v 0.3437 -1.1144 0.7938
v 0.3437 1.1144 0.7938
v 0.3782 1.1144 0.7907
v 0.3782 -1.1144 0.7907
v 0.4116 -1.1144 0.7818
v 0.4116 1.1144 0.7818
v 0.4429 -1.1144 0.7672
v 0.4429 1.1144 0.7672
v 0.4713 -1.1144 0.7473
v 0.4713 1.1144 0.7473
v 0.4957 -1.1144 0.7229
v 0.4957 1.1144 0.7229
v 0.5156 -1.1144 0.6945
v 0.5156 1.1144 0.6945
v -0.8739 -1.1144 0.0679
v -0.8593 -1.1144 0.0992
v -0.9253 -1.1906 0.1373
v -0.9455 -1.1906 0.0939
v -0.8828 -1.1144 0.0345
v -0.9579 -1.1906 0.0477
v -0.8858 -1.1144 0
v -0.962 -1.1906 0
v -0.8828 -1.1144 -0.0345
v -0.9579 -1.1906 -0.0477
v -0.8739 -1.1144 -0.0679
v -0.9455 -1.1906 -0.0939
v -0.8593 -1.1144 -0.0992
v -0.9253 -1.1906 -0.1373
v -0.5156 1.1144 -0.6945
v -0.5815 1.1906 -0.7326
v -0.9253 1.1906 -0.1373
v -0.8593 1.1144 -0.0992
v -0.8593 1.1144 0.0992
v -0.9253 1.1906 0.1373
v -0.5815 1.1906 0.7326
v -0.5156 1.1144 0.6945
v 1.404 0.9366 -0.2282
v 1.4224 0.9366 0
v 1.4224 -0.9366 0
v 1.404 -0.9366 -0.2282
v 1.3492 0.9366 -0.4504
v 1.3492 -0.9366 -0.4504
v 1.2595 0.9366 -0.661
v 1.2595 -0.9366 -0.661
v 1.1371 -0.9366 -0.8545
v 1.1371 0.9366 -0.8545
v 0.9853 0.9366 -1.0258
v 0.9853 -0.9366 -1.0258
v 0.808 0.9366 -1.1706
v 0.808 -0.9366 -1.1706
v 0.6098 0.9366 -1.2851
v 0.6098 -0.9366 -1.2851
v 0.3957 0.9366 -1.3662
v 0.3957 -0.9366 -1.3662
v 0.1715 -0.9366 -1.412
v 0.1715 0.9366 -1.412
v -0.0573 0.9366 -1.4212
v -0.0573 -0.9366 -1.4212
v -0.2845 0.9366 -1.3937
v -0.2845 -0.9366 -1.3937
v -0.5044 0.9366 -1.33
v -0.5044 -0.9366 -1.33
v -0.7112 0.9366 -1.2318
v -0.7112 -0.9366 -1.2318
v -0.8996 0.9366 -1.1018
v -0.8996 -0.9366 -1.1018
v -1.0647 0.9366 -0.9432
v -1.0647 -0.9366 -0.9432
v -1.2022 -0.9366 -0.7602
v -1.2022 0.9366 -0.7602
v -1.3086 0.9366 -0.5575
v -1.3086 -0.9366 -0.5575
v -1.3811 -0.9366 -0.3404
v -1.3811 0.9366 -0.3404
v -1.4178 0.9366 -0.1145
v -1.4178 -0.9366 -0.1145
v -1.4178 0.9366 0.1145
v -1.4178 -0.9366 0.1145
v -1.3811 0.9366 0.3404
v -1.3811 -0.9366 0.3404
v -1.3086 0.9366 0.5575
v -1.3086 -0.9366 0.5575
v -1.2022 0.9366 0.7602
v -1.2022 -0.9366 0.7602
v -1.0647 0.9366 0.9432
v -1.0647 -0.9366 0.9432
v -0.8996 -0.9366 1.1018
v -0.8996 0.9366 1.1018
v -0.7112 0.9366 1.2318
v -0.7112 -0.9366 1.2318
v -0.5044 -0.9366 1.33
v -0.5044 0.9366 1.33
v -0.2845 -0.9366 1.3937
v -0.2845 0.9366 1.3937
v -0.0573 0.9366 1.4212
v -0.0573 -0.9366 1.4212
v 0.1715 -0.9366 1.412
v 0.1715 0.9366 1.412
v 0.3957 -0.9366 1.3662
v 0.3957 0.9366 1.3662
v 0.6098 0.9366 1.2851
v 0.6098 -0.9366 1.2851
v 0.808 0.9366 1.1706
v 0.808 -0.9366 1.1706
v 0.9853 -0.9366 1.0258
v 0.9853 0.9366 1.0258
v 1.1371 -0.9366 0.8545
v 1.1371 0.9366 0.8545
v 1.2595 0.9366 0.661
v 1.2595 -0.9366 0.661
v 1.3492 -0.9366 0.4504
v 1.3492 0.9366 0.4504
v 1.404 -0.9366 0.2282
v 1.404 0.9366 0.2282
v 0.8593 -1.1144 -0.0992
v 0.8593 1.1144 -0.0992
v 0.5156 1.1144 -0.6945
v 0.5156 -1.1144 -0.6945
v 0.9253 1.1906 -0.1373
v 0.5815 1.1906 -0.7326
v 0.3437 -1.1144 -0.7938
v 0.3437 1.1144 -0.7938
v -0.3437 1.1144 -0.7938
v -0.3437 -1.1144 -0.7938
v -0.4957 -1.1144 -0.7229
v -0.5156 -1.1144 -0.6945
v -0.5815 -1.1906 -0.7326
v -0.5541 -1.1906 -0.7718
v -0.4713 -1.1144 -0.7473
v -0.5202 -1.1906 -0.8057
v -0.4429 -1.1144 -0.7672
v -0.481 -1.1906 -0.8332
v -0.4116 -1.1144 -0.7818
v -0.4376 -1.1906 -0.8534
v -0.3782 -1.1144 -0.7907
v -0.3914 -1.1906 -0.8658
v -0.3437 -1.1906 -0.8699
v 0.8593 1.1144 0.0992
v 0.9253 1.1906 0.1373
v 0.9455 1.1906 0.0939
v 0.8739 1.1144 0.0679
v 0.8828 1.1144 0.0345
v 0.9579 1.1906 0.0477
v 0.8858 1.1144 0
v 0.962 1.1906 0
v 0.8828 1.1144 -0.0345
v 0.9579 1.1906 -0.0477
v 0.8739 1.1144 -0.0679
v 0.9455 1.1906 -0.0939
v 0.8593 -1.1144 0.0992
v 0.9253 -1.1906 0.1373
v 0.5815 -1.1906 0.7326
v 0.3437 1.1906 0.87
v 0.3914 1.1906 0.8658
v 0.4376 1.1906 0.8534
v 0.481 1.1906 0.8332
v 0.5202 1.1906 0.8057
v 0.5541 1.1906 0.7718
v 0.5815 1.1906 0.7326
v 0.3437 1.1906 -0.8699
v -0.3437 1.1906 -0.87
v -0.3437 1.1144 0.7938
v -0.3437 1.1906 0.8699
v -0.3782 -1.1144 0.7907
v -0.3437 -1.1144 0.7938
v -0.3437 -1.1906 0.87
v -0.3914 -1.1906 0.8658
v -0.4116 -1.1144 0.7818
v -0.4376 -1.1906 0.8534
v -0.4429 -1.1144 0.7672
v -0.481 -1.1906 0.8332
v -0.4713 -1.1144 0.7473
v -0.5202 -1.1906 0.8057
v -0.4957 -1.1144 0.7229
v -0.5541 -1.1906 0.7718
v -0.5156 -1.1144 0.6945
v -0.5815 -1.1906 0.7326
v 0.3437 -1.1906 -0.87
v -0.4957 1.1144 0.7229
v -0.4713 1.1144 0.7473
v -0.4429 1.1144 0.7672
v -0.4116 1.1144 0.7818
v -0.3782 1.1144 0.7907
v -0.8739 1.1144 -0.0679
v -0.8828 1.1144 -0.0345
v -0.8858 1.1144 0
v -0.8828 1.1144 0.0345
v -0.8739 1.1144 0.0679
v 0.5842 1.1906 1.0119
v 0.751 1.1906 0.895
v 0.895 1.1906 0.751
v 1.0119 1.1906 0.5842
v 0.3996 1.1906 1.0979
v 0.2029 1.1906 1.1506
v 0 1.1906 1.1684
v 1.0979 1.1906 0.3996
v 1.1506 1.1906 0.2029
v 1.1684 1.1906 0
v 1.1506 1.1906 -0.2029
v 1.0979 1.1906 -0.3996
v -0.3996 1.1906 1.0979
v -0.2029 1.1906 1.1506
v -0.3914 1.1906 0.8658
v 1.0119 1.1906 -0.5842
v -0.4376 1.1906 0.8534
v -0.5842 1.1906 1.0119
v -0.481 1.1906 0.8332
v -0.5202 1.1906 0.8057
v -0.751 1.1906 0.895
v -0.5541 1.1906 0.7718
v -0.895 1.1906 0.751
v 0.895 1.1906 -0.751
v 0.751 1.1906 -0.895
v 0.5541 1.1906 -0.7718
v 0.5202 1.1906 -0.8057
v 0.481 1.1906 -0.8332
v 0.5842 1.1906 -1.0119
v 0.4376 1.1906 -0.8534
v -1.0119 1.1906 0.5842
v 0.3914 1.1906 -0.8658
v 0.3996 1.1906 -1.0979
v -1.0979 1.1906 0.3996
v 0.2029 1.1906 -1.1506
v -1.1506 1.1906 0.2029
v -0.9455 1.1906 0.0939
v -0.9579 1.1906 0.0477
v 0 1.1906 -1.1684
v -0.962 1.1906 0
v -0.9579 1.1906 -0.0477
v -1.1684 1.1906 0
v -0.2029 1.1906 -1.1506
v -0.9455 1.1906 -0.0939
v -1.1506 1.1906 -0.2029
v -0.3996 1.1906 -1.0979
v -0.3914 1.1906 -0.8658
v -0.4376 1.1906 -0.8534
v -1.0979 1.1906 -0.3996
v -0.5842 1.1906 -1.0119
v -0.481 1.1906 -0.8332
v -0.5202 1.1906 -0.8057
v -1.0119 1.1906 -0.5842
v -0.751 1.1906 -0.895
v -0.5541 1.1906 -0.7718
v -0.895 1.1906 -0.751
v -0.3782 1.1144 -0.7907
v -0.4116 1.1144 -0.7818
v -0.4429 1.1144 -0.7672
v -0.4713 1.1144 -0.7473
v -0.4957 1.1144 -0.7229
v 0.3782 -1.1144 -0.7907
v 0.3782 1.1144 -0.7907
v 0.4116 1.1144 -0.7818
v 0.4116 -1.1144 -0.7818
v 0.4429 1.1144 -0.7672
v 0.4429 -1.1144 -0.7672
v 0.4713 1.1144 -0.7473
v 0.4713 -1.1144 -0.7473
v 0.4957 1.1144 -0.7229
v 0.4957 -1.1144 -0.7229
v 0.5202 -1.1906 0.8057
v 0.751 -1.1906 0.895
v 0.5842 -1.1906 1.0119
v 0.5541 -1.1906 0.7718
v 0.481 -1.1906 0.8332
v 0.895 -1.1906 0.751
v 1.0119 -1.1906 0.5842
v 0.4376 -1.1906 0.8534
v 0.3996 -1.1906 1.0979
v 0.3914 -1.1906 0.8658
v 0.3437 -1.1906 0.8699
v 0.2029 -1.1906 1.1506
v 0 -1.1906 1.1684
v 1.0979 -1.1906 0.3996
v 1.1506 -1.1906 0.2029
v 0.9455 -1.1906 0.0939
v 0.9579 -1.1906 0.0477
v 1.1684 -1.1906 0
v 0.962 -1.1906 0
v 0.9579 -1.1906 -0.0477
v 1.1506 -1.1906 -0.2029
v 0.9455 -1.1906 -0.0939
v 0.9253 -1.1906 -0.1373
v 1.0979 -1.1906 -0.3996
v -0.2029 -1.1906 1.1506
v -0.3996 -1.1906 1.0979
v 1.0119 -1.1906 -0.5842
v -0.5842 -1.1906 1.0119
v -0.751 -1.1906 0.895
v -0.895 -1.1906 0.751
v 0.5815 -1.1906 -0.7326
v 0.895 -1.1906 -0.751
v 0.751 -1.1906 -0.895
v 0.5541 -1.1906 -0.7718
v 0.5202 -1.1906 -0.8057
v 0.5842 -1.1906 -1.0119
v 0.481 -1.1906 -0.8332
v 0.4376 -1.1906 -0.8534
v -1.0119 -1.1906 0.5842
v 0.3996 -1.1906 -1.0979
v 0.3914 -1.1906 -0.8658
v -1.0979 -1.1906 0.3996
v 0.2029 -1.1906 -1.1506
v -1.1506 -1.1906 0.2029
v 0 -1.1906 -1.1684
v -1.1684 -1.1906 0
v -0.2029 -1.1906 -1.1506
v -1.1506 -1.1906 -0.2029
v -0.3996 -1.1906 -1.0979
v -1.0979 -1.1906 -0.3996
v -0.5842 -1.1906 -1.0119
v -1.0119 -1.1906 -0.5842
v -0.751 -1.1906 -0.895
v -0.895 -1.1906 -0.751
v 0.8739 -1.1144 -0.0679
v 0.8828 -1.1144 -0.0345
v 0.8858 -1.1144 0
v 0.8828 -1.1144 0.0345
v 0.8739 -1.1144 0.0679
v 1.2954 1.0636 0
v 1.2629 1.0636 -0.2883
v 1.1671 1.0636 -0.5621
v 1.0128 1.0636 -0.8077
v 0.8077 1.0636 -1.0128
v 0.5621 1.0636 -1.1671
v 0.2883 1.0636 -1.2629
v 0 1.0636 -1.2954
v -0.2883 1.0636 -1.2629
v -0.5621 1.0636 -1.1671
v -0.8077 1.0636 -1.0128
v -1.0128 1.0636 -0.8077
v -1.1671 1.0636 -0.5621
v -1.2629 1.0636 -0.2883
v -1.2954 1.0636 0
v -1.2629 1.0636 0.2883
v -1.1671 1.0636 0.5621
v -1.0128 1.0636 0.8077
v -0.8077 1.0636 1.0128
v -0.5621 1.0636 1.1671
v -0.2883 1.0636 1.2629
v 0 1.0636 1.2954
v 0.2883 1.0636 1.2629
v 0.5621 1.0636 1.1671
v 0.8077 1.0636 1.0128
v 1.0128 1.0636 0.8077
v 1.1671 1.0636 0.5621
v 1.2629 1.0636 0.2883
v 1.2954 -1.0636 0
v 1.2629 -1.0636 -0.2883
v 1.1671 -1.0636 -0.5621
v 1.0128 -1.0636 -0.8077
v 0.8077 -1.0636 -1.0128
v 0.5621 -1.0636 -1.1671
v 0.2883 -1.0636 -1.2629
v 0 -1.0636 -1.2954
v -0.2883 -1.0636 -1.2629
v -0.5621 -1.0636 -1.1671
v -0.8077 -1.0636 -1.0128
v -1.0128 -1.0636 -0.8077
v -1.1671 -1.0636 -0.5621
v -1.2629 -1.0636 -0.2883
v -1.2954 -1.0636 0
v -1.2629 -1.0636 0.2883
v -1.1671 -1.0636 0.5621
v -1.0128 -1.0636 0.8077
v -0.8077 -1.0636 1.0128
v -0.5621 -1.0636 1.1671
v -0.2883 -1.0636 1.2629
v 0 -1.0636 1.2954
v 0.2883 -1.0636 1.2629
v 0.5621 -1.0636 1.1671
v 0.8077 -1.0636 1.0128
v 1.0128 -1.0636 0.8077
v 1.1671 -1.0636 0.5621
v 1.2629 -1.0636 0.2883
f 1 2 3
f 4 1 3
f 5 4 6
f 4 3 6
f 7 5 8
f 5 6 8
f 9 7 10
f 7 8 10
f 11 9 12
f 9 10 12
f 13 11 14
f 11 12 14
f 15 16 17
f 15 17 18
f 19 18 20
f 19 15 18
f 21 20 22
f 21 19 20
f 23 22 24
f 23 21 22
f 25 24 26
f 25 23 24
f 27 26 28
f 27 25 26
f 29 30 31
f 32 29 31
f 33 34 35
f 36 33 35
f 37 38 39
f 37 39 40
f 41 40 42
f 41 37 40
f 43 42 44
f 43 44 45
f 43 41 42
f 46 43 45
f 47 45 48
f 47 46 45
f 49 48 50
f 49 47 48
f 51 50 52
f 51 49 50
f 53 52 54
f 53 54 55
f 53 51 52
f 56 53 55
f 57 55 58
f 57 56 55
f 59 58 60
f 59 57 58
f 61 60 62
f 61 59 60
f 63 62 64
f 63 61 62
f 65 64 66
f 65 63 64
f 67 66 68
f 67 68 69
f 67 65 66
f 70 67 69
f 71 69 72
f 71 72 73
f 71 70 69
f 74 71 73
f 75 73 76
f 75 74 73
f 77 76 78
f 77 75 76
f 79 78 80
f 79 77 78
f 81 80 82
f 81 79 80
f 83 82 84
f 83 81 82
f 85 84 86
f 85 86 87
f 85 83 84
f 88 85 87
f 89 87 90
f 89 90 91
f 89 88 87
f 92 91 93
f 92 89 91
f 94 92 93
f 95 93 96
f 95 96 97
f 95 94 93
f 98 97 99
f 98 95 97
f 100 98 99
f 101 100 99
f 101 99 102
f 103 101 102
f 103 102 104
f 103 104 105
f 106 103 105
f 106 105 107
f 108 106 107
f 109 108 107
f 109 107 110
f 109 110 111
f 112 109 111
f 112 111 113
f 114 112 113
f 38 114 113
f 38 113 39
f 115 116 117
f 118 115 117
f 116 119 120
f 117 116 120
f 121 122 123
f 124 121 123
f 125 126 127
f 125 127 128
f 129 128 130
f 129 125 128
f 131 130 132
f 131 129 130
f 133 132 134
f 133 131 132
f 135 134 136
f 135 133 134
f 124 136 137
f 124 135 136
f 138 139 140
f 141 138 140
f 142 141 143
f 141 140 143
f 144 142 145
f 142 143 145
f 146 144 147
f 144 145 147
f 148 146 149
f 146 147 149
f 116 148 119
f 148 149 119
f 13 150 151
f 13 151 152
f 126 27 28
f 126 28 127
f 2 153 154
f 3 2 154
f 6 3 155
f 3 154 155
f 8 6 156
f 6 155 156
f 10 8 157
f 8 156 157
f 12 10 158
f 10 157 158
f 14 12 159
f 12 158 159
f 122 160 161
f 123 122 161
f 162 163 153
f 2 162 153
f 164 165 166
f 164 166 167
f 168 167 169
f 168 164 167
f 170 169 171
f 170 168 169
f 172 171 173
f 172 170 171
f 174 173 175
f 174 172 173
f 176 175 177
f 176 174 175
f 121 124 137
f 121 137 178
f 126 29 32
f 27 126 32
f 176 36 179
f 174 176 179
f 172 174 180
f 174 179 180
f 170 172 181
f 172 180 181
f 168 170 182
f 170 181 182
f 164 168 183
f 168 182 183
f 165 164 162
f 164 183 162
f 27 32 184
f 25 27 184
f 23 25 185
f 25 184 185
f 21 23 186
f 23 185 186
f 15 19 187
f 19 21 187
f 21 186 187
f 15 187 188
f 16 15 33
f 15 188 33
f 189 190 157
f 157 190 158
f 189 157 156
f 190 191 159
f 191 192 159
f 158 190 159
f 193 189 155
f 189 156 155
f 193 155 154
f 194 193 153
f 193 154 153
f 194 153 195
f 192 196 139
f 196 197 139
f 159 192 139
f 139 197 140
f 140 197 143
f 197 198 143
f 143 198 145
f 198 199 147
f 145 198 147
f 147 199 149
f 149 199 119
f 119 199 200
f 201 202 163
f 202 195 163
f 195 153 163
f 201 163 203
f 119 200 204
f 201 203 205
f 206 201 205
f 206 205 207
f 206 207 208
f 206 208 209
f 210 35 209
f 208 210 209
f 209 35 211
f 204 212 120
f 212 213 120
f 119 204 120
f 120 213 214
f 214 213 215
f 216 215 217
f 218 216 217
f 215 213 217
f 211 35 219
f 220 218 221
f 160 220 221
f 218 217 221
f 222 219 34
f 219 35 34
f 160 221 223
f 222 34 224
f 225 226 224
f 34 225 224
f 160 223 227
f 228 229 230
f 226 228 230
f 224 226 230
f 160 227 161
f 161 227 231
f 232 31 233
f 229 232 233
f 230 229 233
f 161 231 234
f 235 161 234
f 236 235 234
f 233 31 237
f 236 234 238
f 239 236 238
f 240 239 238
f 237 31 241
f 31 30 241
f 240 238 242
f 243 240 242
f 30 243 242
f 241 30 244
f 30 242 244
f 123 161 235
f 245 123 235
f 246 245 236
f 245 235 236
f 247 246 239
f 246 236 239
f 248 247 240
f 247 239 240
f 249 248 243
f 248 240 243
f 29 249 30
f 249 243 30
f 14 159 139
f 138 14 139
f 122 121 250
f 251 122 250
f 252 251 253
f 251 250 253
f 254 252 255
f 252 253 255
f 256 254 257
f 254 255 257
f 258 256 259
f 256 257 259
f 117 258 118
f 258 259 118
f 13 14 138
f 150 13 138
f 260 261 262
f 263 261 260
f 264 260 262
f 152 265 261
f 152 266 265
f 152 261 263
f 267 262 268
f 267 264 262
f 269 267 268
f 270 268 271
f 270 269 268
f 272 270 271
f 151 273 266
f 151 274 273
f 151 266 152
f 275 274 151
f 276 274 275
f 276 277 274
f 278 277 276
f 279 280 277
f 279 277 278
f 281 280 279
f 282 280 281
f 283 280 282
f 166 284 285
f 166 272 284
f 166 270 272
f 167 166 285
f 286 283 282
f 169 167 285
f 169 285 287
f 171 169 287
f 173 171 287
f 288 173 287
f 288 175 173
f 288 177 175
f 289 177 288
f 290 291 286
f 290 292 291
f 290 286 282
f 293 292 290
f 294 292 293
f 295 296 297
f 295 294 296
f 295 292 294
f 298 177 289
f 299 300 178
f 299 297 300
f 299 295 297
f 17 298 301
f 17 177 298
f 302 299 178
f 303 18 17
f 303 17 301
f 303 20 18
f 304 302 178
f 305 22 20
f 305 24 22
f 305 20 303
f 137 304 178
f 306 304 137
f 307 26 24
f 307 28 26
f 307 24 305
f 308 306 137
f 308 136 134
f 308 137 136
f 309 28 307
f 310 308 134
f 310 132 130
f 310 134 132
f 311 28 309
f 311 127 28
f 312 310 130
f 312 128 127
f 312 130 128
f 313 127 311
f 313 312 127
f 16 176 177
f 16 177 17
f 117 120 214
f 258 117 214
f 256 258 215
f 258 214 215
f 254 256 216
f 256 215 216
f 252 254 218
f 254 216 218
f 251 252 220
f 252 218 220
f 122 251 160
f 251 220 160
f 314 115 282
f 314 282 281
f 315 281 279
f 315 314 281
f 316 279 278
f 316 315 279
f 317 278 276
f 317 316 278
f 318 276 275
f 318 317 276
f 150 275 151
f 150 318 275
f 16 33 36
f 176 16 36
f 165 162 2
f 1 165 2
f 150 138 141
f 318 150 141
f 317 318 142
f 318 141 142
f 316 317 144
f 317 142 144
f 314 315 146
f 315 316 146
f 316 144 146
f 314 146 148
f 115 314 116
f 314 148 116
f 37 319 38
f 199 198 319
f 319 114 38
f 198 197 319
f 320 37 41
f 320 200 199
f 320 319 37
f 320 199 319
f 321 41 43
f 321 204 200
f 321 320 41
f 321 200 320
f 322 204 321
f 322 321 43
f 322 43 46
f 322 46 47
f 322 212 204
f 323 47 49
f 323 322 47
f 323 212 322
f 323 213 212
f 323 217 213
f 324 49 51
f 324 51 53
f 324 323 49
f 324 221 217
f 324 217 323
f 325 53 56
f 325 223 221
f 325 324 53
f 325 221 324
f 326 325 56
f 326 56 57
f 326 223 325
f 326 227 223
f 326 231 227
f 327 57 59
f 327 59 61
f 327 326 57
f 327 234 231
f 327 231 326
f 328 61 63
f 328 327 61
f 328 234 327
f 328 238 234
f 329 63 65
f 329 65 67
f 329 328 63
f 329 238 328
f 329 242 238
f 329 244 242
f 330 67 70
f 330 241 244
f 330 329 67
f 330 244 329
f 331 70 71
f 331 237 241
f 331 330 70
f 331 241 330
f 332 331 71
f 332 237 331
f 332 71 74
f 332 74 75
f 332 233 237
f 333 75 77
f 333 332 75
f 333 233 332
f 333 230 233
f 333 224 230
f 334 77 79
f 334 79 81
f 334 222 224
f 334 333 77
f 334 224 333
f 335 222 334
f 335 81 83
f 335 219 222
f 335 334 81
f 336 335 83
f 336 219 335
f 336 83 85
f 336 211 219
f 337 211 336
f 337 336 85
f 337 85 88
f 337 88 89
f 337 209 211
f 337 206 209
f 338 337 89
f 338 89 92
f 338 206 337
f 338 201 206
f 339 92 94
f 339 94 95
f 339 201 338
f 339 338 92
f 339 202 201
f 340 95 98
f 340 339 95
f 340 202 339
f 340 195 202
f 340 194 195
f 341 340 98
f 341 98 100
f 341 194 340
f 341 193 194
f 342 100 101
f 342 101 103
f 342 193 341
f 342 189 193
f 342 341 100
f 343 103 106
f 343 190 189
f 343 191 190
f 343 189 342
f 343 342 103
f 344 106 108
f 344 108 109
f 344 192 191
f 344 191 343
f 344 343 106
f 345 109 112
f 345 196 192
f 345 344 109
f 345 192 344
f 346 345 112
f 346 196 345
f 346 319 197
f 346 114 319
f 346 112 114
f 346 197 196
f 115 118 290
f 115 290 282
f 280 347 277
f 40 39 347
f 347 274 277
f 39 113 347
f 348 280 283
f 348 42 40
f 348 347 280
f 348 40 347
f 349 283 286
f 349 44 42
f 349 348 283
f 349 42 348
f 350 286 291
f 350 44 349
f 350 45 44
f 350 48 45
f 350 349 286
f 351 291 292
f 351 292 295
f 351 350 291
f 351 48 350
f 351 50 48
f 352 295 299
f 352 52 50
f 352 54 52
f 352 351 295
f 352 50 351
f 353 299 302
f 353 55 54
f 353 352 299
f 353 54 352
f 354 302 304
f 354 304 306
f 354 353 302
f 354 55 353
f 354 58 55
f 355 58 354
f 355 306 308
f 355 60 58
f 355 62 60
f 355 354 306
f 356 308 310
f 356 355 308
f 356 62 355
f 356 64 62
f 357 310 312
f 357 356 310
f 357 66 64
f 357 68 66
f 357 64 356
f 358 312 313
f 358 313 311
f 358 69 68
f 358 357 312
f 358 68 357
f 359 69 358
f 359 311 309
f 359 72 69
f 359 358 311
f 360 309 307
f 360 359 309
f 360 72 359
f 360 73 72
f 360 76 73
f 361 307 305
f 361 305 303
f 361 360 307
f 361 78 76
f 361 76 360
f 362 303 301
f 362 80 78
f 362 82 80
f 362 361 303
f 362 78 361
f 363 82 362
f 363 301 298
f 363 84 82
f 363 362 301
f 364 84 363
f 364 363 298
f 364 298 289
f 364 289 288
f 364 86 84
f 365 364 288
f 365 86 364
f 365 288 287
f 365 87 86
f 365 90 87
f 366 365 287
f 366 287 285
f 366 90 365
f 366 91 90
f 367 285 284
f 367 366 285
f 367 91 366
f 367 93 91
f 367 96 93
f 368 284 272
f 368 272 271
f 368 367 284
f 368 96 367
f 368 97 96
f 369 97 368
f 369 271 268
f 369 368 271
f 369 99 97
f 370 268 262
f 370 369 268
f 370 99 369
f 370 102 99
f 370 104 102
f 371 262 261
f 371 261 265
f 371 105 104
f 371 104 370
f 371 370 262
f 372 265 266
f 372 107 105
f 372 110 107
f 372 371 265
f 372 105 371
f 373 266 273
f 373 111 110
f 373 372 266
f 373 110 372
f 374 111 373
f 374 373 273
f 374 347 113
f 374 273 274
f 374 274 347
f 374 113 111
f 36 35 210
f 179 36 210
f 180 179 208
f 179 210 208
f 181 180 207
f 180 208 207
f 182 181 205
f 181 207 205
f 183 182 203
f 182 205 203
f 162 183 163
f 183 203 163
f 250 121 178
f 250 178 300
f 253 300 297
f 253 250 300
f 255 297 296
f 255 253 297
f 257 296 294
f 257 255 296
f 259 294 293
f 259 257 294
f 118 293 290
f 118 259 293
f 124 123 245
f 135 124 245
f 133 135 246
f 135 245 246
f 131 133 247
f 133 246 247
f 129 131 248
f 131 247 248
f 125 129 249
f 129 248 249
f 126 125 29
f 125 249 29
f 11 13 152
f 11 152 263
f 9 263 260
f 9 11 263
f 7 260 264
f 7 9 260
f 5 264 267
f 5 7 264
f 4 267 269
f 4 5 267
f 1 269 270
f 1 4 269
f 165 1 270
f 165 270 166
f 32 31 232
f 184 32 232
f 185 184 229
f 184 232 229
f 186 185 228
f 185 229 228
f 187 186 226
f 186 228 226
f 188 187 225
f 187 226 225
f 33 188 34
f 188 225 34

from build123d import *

# Parameters (mm, degrees)
SKETCH1_W               = 1.4224
SKETCH1_H               = 2.38125
CUT_EXTRUDE1_DEPTH      = 2.190625
CUT_EXTRUDE1_DEPTH_BACK = 2.190625
FILLET1_R               = 0.1984375
CHAMFER1_SIZE           = 0.254
CHAMFER2_SIZE           = 0.0762


with BuildPart() as part:
    # Sketch1 → Revolve1 (revolve)
    with BuildSketch(Plane.XY):
        with Locations((0.7112, 0)):
            Rectangle(SKETCH1_W, SKETCH1_H)
    revolve(axis=Axis((0, -1.704166029, 0), (0, 1, 0)))

    # Sketch3 → Cut-Extrude1 (cut, two sides)
    with BuildSketch(Plane(origin=(0, 0, 0), x_dir=(1, 0, 0), z_dir=(0, 1, 0))) as cut_extrude1_sk:
        Polygon((0.916543552, 0), (0.458271776, 0.79375), (-0.458271776, 0.79375), (-0.916543552, 0), (-0.458271776, -0.79375), (0.458271776, -0.79375), align=None)
    extrude(amount=CUT_EXTRUDE1_DEPTH, mode=Mode.SUBTRACT)
    extrude(cut_extrude1_sk.sketch, amount=-CUT_EXTRUDE1_DEPTH_BACK, mode=Mode.SUBTRACT)

    # Fillet1
    fillet1_edges = [part.edges().sort_by_distance(p)[0] for p in [
        (0.458271776, 0, -0.79375),
        (0.916543552, 0, 0),
        (0.458271776, 0, 0.79375),
        (-0.458271776, 0, 0.79375),
        (-0.916543552, 0, 0),
        (-0.458271776, 0, -0.79375),
    ]]
    fillet(fillet1_edges, radius=FILLET1_R)

    # Chamfer1
    chamfer1_edges = [part.edges().sort_by_distance(p)[0] for p in [
        (-1.4224, 1.190625, 0),
        (-1.4224, -1.190625, 0),
    ]]
    chamfer(chamfer1_edges, length=CHAMFER1_SIZE)

    # Chamfer2
    chamfer2_edges = [part.edges().sort_by_distance(p)[0] for p in [
        (0.687407664, -1.190625, -0.396875),
        (0.687407664, 1.190625, -0.396875),
        (0.687407664, -1.190625, 0.396875),
        (0.687407664, 1.190625, 0.396875),
        (0, -1.190625, 0.79375),
        (0, 1.190625, 0.79375),
        (-0.687407664, -1.190625, 0.396875),
        (-0.687407664, 1.190625, 0.396875),
        (-0.687407664, -1.190625, -0.396875),
        (-0.687407664, 1.190625, -0.396875),
        (0, -1.190625, -0.79375),
        (0, 1.190625, -0.79375),
        (0.885845164, 1.190625, 0),
        (0.885845164, -1.190625, 0),
        (0.442922582, 1.190625, 0.767164416),
        (0.442922582, -1.190625, 0.767164416),
        (-0.442922582, 1.190625, 0.767164416),
        (-0.442922582, -1.190625, 0.767164416),
        (-0.885845164, 1.190625, 0),
        (-0.885845164, -1.190625, 0),
        (-0.442922582, 1.190625, -0.767164416),
        (-0.442922582, -1.190625, -0.767164416),
        (0.442922582, 1.190625, -0.767164416),
        (0.442922582, -1.190625, -0.767164416),
    ]]
    chamfer(chamfer2_edges, length=CHAMFER2_SIZE)


solid = part.part
